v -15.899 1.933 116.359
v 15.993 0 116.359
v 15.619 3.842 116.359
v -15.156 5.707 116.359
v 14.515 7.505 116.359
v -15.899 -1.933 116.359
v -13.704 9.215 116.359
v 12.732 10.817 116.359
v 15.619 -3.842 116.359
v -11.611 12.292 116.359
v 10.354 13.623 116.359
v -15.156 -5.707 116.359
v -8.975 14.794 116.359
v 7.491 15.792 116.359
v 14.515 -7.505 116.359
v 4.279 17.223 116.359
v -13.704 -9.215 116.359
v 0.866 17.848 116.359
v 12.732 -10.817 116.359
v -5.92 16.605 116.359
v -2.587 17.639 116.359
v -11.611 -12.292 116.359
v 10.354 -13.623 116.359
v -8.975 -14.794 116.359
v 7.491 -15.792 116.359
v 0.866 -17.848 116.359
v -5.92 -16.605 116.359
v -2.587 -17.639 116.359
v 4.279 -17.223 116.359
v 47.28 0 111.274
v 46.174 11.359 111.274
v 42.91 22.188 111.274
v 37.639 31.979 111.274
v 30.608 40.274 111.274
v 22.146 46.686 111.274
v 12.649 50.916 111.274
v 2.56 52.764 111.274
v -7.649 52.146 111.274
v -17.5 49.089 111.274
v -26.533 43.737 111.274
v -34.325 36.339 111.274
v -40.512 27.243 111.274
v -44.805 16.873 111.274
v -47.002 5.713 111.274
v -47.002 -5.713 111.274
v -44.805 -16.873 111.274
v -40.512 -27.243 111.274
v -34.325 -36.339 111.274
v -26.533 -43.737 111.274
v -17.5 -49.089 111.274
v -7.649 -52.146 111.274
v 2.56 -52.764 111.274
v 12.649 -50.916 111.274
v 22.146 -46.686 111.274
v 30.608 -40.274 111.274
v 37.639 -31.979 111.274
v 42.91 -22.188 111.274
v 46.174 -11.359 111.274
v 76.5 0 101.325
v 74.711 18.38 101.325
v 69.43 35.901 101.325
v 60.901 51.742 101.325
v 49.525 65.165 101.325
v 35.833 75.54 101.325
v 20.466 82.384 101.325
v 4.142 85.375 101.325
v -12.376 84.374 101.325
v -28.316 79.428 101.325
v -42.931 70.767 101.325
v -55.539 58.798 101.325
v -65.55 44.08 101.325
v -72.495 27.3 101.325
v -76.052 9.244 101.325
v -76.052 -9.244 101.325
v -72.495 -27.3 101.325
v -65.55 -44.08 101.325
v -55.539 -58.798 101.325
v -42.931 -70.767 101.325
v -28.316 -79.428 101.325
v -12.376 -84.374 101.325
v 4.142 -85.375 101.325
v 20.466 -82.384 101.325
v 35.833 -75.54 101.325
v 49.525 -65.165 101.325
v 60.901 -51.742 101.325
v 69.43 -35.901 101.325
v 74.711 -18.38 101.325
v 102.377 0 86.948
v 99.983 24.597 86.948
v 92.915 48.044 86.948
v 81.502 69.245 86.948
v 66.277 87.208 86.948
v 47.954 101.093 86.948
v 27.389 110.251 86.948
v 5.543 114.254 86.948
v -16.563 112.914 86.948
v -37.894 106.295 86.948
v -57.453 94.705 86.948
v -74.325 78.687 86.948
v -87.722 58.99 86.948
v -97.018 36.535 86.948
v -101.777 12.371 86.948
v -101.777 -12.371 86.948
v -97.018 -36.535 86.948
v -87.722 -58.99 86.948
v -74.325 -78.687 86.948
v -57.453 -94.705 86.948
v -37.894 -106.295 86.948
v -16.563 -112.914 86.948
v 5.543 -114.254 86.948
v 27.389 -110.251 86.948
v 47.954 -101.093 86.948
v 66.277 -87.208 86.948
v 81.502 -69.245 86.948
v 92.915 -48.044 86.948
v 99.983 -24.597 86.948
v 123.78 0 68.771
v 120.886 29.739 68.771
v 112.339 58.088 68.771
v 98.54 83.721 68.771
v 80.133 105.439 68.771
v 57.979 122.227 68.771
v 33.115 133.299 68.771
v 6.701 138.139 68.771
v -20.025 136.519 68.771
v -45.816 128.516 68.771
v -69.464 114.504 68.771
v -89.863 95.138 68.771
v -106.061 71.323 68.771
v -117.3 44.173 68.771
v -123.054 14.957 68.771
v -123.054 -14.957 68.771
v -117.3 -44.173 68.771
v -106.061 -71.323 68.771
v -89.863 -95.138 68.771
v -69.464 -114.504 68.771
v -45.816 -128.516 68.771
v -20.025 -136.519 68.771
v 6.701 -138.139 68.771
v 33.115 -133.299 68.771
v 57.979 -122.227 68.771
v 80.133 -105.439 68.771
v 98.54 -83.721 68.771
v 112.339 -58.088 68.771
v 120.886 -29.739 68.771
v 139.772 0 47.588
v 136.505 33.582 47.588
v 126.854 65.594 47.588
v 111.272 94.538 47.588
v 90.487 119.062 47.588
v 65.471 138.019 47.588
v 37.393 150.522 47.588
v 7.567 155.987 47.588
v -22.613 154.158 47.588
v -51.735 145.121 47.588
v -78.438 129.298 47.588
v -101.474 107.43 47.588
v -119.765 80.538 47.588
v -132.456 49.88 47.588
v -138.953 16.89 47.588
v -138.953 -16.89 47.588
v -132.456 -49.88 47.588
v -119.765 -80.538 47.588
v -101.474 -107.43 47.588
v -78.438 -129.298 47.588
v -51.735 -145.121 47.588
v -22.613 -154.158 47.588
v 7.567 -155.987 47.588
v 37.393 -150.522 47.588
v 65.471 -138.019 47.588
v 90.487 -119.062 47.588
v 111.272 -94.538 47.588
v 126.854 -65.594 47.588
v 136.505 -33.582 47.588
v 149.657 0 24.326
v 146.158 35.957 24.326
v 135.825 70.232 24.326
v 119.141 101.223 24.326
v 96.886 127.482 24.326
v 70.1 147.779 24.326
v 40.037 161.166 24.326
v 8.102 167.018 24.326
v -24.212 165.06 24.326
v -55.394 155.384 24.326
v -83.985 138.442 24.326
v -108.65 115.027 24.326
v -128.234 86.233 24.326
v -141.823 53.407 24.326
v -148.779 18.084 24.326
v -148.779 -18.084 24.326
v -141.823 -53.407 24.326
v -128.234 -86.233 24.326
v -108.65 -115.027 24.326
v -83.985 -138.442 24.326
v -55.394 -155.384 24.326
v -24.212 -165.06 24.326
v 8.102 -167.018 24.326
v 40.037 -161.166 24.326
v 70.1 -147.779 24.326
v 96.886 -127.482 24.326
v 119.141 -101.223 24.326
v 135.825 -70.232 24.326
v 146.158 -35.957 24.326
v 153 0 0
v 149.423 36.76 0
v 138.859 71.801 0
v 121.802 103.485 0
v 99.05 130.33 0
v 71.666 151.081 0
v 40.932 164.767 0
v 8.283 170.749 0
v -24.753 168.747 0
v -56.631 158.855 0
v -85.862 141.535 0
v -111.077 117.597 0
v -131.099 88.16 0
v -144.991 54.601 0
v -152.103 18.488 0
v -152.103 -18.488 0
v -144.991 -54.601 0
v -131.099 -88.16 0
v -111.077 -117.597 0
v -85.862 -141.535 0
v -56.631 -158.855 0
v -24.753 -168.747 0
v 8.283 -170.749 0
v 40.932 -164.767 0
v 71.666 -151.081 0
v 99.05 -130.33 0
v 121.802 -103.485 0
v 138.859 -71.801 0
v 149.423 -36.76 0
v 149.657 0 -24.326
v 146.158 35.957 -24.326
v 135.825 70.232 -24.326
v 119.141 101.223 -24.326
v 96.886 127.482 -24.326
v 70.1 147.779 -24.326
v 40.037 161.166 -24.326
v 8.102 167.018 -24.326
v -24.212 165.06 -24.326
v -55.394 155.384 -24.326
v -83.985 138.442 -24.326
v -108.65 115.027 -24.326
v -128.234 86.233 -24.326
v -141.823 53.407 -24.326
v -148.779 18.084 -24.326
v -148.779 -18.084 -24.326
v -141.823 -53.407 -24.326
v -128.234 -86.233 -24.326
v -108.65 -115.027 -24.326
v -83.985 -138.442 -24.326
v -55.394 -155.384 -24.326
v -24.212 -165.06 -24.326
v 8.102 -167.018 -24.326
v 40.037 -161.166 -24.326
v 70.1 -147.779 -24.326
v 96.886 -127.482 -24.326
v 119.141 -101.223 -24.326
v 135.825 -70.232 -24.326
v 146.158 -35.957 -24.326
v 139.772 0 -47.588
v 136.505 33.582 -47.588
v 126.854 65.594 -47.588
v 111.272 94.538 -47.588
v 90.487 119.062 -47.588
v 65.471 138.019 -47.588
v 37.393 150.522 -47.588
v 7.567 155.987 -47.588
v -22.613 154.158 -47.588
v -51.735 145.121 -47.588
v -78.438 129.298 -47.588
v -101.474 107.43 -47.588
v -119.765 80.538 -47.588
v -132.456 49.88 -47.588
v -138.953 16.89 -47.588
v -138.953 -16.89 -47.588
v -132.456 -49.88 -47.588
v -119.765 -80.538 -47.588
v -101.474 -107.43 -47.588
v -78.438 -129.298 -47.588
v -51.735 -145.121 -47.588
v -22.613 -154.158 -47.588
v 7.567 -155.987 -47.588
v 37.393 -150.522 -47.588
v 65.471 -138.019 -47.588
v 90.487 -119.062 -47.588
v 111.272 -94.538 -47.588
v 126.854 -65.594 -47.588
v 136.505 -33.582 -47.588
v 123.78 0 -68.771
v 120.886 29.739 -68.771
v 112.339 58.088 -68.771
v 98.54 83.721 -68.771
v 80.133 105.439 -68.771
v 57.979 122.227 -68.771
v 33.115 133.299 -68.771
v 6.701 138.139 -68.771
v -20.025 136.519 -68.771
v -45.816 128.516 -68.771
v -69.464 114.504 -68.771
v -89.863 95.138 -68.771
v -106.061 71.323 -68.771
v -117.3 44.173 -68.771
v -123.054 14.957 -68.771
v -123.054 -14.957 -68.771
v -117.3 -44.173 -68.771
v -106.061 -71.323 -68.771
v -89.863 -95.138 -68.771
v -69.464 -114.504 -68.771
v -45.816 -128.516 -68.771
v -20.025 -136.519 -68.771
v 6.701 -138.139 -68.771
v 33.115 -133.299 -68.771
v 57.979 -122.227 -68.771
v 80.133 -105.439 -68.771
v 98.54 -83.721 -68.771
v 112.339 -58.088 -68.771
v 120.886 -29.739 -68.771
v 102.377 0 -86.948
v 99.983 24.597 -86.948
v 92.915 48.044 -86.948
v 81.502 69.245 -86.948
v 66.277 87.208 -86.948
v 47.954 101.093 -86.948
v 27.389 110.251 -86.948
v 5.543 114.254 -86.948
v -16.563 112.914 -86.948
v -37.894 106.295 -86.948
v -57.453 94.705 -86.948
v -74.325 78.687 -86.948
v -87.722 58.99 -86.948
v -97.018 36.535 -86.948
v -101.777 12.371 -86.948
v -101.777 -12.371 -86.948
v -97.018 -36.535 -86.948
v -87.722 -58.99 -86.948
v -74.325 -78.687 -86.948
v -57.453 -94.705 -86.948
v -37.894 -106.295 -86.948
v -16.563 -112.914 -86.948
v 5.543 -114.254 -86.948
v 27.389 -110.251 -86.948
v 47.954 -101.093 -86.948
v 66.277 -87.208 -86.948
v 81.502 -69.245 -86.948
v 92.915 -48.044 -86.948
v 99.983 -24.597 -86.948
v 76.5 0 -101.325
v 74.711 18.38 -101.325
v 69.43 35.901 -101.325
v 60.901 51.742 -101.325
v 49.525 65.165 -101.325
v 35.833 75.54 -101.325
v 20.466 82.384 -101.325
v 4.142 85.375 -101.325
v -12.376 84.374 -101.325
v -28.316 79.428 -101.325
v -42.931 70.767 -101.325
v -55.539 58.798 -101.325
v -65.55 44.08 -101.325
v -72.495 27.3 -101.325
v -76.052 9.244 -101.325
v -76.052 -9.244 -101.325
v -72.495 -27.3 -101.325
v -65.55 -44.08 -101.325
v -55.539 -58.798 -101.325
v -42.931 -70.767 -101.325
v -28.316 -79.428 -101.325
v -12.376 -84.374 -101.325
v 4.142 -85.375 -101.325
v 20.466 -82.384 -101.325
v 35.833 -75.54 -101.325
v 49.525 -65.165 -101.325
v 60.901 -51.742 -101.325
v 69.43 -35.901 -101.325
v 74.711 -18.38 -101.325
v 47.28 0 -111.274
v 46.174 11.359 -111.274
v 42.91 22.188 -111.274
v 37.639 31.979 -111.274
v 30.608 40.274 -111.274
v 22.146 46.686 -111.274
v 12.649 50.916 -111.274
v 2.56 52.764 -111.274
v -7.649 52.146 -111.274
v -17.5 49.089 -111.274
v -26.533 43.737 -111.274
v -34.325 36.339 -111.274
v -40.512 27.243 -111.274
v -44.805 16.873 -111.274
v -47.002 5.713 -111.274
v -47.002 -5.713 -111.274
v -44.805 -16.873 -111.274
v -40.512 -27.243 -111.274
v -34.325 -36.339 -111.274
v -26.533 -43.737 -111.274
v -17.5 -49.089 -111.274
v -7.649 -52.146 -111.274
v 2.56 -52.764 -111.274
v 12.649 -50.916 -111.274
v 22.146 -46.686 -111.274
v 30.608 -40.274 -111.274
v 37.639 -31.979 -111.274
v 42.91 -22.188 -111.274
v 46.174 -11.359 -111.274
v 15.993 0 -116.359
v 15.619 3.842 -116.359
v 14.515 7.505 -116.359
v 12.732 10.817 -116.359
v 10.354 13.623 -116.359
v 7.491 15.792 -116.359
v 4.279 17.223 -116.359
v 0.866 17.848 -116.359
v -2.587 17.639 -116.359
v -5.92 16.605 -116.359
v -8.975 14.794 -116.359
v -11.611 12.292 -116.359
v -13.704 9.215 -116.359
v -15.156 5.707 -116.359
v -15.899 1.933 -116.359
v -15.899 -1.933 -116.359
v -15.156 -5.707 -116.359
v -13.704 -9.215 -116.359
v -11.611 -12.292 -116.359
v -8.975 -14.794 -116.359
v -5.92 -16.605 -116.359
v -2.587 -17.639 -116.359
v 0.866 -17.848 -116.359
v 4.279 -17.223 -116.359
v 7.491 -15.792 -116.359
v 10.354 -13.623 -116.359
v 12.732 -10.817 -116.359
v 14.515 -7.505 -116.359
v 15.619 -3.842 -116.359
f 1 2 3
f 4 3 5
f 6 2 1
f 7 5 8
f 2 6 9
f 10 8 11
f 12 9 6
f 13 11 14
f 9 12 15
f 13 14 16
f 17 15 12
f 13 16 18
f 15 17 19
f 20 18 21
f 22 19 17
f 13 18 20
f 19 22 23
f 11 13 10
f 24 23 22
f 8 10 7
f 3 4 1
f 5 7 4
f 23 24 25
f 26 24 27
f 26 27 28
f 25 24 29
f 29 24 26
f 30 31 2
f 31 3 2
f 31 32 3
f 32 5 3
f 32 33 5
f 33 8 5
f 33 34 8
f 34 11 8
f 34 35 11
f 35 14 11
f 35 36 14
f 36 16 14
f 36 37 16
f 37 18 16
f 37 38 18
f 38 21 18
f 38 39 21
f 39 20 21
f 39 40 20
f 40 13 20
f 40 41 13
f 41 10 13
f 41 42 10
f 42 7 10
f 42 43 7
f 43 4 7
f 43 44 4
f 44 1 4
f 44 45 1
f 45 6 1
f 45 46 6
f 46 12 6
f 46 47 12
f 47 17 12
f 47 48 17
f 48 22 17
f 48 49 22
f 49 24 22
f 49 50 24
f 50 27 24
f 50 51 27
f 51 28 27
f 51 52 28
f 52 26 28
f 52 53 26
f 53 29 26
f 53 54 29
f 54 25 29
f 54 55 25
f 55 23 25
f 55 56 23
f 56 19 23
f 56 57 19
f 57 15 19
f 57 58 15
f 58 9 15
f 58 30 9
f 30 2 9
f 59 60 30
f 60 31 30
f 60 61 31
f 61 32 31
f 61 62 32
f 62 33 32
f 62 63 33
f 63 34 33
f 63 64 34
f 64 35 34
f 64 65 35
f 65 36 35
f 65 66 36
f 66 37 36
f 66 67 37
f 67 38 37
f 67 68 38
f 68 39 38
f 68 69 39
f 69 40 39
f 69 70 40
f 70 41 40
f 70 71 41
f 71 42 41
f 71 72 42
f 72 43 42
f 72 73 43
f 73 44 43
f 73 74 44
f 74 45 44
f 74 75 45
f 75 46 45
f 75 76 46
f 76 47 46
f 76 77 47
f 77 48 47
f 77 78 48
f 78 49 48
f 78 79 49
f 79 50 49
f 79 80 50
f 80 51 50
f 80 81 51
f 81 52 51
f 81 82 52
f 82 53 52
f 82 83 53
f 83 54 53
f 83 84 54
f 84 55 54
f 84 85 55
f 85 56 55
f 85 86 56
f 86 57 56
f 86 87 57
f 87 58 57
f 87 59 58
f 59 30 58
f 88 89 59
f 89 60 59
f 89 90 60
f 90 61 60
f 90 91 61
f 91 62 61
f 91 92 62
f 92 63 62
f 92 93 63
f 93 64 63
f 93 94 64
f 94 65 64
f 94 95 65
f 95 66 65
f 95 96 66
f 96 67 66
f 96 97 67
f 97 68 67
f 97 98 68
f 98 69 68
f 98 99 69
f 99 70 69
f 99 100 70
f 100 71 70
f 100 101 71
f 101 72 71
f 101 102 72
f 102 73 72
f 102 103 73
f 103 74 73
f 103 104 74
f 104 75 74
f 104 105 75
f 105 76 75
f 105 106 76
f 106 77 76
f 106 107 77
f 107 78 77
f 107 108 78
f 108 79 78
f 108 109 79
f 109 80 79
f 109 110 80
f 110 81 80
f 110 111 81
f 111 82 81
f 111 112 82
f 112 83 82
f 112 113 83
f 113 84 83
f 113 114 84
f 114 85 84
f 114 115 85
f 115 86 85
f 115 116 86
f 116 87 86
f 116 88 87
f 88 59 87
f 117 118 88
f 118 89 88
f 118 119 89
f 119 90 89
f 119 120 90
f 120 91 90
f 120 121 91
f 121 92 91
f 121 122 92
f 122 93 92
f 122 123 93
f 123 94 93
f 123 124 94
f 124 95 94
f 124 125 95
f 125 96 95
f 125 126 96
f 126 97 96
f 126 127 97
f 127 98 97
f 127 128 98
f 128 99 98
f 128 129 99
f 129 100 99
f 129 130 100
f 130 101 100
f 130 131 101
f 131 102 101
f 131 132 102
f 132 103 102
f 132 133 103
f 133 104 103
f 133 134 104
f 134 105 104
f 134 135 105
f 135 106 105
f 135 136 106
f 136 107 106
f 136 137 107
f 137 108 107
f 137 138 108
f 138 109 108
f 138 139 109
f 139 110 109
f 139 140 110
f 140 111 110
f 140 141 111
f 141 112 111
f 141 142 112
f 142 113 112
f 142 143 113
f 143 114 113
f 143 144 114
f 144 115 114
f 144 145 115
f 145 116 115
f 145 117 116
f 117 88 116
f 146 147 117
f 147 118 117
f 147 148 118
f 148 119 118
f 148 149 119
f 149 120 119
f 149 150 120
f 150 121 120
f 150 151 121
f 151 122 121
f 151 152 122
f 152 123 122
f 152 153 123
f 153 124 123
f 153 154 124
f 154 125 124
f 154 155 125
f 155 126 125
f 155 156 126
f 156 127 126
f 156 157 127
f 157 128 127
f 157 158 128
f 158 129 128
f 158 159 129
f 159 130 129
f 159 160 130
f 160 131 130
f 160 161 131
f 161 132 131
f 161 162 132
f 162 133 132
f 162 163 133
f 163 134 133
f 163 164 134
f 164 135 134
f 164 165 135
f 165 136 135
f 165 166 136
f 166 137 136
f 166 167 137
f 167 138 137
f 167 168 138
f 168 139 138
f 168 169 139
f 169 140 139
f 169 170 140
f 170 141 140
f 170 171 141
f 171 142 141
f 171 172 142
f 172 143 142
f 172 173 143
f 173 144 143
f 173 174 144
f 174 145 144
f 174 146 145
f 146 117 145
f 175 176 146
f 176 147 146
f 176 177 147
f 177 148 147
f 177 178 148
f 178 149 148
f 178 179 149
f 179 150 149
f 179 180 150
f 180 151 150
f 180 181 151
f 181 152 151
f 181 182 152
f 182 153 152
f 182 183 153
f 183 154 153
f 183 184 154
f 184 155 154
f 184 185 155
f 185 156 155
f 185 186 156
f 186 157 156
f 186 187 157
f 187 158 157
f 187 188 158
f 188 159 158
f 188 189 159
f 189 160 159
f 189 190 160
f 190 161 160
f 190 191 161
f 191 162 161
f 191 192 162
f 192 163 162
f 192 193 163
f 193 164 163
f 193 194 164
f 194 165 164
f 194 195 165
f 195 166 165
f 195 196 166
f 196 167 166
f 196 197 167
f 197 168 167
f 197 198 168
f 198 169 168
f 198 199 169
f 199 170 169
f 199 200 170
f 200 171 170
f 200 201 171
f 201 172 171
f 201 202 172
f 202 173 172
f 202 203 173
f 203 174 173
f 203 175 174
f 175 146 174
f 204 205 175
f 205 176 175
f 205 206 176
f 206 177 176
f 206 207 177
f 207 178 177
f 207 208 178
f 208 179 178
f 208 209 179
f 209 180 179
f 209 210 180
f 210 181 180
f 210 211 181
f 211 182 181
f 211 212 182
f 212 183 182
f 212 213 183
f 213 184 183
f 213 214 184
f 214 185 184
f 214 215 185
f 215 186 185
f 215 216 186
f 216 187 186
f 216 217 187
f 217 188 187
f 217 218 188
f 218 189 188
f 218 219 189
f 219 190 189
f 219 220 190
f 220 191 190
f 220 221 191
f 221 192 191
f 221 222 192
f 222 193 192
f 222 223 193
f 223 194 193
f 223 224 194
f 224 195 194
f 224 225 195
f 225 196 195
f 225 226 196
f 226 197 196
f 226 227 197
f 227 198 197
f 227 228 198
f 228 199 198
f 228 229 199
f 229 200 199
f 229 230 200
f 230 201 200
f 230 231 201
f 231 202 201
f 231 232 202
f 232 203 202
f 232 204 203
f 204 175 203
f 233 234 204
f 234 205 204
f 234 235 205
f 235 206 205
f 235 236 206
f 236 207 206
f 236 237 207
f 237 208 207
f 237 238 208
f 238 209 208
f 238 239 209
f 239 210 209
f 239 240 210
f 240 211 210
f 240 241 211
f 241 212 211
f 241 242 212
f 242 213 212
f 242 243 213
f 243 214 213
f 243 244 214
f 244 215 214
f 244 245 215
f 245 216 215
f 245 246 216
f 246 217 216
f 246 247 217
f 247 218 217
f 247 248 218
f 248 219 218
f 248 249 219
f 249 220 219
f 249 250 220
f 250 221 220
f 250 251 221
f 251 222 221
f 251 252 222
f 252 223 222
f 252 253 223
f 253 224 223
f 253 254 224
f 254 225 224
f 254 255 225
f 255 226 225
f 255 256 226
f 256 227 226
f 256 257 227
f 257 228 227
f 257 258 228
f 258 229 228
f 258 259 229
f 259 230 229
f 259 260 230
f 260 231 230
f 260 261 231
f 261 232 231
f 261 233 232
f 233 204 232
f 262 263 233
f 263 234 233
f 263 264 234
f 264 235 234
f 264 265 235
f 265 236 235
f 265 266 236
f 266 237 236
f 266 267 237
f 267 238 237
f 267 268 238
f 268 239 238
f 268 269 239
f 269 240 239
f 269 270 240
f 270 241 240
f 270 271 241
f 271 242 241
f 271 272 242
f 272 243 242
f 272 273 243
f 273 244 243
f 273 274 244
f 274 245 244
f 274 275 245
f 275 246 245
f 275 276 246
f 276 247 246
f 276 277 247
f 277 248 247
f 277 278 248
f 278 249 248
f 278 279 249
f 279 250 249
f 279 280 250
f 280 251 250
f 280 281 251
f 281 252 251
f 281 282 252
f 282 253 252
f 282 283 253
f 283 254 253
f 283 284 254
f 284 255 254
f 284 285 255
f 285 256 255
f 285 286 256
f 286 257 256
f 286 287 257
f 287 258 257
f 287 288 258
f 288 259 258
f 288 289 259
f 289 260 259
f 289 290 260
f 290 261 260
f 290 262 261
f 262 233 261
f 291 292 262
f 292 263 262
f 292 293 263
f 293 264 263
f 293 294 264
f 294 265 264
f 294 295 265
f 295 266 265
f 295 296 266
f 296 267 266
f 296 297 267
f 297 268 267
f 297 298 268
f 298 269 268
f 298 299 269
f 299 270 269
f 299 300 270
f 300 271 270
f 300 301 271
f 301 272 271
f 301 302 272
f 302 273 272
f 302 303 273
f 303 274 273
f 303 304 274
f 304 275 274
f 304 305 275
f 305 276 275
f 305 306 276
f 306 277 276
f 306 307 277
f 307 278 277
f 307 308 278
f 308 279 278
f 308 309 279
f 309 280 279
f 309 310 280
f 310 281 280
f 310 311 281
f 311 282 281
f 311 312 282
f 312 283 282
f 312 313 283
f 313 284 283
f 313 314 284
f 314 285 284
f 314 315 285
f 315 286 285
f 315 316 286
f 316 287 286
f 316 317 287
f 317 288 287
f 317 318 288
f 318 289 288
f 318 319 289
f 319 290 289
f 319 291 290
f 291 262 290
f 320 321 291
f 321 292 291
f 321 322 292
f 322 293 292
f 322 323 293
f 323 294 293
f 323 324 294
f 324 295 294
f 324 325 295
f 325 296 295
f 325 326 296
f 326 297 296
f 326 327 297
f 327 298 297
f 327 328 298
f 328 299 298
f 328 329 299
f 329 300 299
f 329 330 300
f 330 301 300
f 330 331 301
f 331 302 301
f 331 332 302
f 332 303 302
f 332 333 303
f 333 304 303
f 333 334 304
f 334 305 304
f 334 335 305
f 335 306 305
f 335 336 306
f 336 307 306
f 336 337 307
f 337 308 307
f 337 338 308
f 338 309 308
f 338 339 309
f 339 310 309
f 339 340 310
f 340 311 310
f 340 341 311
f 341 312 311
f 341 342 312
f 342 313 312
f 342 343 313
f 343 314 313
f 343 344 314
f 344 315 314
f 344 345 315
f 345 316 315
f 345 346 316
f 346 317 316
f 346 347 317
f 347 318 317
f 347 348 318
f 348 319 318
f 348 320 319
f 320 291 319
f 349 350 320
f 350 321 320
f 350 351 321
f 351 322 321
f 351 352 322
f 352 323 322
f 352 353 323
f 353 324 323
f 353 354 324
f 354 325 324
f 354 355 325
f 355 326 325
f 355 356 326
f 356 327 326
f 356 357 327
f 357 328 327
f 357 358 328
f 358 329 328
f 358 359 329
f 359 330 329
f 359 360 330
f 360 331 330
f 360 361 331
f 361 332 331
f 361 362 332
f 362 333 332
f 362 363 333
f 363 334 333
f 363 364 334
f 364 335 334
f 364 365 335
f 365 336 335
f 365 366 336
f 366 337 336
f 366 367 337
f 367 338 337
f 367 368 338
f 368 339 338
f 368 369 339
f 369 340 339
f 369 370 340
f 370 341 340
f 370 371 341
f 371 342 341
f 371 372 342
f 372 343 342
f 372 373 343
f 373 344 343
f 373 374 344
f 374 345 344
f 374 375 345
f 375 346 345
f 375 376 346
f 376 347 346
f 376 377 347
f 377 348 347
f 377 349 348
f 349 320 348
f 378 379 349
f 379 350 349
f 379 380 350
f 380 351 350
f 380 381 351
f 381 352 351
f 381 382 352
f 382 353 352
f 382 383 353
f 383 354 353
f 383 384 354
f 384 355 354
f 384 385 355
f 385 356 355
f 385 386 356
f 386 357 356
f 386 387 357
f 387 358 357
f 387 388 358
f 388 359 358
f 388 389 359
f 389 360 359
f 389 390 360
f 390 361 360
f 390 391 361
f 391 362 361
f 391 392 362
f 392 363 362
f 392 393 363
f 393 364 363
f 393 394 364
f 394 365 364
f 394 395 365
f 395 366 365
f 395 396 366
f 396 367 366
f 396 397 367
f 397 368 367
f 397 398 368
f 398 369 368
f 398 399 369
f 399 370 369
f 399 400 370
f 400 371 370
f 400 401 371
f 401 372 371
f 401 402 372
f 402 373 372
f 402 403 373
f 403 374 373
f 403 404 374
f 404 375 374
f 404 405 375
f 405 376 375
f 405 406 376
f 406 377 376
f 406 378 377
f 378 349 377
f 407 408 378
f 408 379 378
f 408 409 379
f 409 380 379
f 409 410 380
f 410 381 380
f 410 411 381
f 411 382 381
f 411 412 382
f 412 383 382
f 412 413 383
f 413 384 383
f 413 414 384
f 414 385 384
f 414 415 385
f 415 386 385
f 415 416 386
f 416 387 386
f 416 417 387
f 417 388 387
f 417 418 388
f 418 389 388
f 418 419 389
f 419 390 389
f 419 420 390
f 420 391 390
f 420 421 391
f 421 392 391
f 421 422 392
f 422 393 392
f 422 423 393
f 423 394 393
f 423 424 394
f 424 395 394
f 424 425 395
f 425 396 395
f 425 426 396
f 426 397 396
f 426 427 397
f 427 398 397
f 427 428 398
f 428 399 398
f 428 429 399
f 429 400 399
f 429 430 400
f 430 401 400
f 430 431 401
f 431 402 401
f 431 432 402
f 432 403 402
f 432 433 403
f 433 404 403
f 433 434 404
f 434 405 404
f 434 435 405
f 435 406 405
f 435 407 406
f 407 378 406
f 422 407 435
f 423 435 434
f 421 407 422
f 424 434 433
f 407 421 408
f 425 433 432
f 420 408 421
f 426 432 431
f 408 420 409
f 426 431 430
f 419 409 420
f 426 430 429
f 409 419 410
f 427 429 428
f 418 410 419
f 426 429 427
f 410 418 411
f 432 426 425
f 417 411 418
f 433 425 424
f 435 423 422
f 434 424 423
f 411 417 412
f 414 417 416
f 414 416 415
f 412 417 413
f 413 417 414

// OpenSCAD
// Generated by SolidPython 1.0.1 on 2020-07-29 00:46:53


scale(v = [17, 19, 13]) {
	sphere(r = 9);
}
/***********************************************
*********      SolidPython code:      **********
************************************************
 
# import packages: SolidPython
from solid import *
from solid.utils import *
from itertools import chain, combinations, permutations


class Resize:

    def __init__(self, scad_file):
        self.scad_file = scad_file
        #self.scad_file = import_scad(scad_file)
        # cone/cylinder param:
        self.r1 = 0
        self.r2 = 0
        self.h = 0
        # rectangular prism param:
        self.w = 0
        self.l = 0
        # ellipse param:
        self.r = 0

    # import OpenScad code (file name corresponds to shape)


    # classify shape + parameters
    def assign(self, param1, param2, param3):
        if self.scad_file == 'cone.scad':
            self.r1 = param1
            self.r2 = param2
            self.h = param3
        elif self.scad_file == 'cylinder.scad':
            self.r1 = param1
            self.r2 = param2
            self.h = param3
        elif self.scad_file == 'rectangularPrism.scad':
            self.h = param1
            self.l = param2
            self.w = param3
        else:
            self.r = param1
            self.h = param2

    # resize parameters
    def iterate(self):
        x = range(3, 20, 2)
        i = 1
        if self.scad_file == 'cone.scad':
            tempList = list(permutations(x, 2))
            for temp in tempList:
                param1 = temp[0]
                param2 = temp[1]
                filepath = 'produced_scad_files/' + 'cone' + str(param1) + '_' + str(param2) + '_' + '.scad'
                scad_render_to_file(cylinder(h=param1, r1=param2, r2=0), filepath)

        elif self.scad_file == 'cylinder.scad':
            tempList = list(permutations(x, 3))
            for temp in tempList:
                param1 = temp[0]
                param2 = temp[1]
                filepath = 'produced_scad_files/' + 'cylinder' + str(param1) + '_' + str(param2) + '_' + '.scad'
                scad_render_to_file(cylinder(h=param1, r1=param2, r2=param2), filepath)

        elif self.scad_file == 'rectangularPrism.scad':
            tempList = list(permutations(x, 3))
            for temp in tempList:
                param1 = temp[0]
                param2 = temp[1]
                param3 = temp[2]
                filepath = 'produced_scad_files/' + 'rectangularPrism' + str(param1) + '_' + str(param2) + '_' + str(
                    param3) + '.scad'
                scad_render_to_file(cube(size=(param1, param2, param3)), filepath)

        elif self.scad_file == 'ellipse.scad':
            tempList = list(permutations(x, 4))
            for temp in tempList:
                param1 = temp[0]
                param2 = temp[1]
                param3 = temp[2]
                param4 = temp[3]
                filepath = 'produced_scad_files/' + 'ellipse' + str(param1) + '_' + str(param2) + '_' + str(param3) + '_' + str(param4) + '.scad'
                scad_render_to_file(scale([param1, param2, param3])(sphere(r=param4)), filepath)

    def render_to_scadfile(self):
        scad_render_to_file(scad, 'example.scad') 
 
************************************************/
